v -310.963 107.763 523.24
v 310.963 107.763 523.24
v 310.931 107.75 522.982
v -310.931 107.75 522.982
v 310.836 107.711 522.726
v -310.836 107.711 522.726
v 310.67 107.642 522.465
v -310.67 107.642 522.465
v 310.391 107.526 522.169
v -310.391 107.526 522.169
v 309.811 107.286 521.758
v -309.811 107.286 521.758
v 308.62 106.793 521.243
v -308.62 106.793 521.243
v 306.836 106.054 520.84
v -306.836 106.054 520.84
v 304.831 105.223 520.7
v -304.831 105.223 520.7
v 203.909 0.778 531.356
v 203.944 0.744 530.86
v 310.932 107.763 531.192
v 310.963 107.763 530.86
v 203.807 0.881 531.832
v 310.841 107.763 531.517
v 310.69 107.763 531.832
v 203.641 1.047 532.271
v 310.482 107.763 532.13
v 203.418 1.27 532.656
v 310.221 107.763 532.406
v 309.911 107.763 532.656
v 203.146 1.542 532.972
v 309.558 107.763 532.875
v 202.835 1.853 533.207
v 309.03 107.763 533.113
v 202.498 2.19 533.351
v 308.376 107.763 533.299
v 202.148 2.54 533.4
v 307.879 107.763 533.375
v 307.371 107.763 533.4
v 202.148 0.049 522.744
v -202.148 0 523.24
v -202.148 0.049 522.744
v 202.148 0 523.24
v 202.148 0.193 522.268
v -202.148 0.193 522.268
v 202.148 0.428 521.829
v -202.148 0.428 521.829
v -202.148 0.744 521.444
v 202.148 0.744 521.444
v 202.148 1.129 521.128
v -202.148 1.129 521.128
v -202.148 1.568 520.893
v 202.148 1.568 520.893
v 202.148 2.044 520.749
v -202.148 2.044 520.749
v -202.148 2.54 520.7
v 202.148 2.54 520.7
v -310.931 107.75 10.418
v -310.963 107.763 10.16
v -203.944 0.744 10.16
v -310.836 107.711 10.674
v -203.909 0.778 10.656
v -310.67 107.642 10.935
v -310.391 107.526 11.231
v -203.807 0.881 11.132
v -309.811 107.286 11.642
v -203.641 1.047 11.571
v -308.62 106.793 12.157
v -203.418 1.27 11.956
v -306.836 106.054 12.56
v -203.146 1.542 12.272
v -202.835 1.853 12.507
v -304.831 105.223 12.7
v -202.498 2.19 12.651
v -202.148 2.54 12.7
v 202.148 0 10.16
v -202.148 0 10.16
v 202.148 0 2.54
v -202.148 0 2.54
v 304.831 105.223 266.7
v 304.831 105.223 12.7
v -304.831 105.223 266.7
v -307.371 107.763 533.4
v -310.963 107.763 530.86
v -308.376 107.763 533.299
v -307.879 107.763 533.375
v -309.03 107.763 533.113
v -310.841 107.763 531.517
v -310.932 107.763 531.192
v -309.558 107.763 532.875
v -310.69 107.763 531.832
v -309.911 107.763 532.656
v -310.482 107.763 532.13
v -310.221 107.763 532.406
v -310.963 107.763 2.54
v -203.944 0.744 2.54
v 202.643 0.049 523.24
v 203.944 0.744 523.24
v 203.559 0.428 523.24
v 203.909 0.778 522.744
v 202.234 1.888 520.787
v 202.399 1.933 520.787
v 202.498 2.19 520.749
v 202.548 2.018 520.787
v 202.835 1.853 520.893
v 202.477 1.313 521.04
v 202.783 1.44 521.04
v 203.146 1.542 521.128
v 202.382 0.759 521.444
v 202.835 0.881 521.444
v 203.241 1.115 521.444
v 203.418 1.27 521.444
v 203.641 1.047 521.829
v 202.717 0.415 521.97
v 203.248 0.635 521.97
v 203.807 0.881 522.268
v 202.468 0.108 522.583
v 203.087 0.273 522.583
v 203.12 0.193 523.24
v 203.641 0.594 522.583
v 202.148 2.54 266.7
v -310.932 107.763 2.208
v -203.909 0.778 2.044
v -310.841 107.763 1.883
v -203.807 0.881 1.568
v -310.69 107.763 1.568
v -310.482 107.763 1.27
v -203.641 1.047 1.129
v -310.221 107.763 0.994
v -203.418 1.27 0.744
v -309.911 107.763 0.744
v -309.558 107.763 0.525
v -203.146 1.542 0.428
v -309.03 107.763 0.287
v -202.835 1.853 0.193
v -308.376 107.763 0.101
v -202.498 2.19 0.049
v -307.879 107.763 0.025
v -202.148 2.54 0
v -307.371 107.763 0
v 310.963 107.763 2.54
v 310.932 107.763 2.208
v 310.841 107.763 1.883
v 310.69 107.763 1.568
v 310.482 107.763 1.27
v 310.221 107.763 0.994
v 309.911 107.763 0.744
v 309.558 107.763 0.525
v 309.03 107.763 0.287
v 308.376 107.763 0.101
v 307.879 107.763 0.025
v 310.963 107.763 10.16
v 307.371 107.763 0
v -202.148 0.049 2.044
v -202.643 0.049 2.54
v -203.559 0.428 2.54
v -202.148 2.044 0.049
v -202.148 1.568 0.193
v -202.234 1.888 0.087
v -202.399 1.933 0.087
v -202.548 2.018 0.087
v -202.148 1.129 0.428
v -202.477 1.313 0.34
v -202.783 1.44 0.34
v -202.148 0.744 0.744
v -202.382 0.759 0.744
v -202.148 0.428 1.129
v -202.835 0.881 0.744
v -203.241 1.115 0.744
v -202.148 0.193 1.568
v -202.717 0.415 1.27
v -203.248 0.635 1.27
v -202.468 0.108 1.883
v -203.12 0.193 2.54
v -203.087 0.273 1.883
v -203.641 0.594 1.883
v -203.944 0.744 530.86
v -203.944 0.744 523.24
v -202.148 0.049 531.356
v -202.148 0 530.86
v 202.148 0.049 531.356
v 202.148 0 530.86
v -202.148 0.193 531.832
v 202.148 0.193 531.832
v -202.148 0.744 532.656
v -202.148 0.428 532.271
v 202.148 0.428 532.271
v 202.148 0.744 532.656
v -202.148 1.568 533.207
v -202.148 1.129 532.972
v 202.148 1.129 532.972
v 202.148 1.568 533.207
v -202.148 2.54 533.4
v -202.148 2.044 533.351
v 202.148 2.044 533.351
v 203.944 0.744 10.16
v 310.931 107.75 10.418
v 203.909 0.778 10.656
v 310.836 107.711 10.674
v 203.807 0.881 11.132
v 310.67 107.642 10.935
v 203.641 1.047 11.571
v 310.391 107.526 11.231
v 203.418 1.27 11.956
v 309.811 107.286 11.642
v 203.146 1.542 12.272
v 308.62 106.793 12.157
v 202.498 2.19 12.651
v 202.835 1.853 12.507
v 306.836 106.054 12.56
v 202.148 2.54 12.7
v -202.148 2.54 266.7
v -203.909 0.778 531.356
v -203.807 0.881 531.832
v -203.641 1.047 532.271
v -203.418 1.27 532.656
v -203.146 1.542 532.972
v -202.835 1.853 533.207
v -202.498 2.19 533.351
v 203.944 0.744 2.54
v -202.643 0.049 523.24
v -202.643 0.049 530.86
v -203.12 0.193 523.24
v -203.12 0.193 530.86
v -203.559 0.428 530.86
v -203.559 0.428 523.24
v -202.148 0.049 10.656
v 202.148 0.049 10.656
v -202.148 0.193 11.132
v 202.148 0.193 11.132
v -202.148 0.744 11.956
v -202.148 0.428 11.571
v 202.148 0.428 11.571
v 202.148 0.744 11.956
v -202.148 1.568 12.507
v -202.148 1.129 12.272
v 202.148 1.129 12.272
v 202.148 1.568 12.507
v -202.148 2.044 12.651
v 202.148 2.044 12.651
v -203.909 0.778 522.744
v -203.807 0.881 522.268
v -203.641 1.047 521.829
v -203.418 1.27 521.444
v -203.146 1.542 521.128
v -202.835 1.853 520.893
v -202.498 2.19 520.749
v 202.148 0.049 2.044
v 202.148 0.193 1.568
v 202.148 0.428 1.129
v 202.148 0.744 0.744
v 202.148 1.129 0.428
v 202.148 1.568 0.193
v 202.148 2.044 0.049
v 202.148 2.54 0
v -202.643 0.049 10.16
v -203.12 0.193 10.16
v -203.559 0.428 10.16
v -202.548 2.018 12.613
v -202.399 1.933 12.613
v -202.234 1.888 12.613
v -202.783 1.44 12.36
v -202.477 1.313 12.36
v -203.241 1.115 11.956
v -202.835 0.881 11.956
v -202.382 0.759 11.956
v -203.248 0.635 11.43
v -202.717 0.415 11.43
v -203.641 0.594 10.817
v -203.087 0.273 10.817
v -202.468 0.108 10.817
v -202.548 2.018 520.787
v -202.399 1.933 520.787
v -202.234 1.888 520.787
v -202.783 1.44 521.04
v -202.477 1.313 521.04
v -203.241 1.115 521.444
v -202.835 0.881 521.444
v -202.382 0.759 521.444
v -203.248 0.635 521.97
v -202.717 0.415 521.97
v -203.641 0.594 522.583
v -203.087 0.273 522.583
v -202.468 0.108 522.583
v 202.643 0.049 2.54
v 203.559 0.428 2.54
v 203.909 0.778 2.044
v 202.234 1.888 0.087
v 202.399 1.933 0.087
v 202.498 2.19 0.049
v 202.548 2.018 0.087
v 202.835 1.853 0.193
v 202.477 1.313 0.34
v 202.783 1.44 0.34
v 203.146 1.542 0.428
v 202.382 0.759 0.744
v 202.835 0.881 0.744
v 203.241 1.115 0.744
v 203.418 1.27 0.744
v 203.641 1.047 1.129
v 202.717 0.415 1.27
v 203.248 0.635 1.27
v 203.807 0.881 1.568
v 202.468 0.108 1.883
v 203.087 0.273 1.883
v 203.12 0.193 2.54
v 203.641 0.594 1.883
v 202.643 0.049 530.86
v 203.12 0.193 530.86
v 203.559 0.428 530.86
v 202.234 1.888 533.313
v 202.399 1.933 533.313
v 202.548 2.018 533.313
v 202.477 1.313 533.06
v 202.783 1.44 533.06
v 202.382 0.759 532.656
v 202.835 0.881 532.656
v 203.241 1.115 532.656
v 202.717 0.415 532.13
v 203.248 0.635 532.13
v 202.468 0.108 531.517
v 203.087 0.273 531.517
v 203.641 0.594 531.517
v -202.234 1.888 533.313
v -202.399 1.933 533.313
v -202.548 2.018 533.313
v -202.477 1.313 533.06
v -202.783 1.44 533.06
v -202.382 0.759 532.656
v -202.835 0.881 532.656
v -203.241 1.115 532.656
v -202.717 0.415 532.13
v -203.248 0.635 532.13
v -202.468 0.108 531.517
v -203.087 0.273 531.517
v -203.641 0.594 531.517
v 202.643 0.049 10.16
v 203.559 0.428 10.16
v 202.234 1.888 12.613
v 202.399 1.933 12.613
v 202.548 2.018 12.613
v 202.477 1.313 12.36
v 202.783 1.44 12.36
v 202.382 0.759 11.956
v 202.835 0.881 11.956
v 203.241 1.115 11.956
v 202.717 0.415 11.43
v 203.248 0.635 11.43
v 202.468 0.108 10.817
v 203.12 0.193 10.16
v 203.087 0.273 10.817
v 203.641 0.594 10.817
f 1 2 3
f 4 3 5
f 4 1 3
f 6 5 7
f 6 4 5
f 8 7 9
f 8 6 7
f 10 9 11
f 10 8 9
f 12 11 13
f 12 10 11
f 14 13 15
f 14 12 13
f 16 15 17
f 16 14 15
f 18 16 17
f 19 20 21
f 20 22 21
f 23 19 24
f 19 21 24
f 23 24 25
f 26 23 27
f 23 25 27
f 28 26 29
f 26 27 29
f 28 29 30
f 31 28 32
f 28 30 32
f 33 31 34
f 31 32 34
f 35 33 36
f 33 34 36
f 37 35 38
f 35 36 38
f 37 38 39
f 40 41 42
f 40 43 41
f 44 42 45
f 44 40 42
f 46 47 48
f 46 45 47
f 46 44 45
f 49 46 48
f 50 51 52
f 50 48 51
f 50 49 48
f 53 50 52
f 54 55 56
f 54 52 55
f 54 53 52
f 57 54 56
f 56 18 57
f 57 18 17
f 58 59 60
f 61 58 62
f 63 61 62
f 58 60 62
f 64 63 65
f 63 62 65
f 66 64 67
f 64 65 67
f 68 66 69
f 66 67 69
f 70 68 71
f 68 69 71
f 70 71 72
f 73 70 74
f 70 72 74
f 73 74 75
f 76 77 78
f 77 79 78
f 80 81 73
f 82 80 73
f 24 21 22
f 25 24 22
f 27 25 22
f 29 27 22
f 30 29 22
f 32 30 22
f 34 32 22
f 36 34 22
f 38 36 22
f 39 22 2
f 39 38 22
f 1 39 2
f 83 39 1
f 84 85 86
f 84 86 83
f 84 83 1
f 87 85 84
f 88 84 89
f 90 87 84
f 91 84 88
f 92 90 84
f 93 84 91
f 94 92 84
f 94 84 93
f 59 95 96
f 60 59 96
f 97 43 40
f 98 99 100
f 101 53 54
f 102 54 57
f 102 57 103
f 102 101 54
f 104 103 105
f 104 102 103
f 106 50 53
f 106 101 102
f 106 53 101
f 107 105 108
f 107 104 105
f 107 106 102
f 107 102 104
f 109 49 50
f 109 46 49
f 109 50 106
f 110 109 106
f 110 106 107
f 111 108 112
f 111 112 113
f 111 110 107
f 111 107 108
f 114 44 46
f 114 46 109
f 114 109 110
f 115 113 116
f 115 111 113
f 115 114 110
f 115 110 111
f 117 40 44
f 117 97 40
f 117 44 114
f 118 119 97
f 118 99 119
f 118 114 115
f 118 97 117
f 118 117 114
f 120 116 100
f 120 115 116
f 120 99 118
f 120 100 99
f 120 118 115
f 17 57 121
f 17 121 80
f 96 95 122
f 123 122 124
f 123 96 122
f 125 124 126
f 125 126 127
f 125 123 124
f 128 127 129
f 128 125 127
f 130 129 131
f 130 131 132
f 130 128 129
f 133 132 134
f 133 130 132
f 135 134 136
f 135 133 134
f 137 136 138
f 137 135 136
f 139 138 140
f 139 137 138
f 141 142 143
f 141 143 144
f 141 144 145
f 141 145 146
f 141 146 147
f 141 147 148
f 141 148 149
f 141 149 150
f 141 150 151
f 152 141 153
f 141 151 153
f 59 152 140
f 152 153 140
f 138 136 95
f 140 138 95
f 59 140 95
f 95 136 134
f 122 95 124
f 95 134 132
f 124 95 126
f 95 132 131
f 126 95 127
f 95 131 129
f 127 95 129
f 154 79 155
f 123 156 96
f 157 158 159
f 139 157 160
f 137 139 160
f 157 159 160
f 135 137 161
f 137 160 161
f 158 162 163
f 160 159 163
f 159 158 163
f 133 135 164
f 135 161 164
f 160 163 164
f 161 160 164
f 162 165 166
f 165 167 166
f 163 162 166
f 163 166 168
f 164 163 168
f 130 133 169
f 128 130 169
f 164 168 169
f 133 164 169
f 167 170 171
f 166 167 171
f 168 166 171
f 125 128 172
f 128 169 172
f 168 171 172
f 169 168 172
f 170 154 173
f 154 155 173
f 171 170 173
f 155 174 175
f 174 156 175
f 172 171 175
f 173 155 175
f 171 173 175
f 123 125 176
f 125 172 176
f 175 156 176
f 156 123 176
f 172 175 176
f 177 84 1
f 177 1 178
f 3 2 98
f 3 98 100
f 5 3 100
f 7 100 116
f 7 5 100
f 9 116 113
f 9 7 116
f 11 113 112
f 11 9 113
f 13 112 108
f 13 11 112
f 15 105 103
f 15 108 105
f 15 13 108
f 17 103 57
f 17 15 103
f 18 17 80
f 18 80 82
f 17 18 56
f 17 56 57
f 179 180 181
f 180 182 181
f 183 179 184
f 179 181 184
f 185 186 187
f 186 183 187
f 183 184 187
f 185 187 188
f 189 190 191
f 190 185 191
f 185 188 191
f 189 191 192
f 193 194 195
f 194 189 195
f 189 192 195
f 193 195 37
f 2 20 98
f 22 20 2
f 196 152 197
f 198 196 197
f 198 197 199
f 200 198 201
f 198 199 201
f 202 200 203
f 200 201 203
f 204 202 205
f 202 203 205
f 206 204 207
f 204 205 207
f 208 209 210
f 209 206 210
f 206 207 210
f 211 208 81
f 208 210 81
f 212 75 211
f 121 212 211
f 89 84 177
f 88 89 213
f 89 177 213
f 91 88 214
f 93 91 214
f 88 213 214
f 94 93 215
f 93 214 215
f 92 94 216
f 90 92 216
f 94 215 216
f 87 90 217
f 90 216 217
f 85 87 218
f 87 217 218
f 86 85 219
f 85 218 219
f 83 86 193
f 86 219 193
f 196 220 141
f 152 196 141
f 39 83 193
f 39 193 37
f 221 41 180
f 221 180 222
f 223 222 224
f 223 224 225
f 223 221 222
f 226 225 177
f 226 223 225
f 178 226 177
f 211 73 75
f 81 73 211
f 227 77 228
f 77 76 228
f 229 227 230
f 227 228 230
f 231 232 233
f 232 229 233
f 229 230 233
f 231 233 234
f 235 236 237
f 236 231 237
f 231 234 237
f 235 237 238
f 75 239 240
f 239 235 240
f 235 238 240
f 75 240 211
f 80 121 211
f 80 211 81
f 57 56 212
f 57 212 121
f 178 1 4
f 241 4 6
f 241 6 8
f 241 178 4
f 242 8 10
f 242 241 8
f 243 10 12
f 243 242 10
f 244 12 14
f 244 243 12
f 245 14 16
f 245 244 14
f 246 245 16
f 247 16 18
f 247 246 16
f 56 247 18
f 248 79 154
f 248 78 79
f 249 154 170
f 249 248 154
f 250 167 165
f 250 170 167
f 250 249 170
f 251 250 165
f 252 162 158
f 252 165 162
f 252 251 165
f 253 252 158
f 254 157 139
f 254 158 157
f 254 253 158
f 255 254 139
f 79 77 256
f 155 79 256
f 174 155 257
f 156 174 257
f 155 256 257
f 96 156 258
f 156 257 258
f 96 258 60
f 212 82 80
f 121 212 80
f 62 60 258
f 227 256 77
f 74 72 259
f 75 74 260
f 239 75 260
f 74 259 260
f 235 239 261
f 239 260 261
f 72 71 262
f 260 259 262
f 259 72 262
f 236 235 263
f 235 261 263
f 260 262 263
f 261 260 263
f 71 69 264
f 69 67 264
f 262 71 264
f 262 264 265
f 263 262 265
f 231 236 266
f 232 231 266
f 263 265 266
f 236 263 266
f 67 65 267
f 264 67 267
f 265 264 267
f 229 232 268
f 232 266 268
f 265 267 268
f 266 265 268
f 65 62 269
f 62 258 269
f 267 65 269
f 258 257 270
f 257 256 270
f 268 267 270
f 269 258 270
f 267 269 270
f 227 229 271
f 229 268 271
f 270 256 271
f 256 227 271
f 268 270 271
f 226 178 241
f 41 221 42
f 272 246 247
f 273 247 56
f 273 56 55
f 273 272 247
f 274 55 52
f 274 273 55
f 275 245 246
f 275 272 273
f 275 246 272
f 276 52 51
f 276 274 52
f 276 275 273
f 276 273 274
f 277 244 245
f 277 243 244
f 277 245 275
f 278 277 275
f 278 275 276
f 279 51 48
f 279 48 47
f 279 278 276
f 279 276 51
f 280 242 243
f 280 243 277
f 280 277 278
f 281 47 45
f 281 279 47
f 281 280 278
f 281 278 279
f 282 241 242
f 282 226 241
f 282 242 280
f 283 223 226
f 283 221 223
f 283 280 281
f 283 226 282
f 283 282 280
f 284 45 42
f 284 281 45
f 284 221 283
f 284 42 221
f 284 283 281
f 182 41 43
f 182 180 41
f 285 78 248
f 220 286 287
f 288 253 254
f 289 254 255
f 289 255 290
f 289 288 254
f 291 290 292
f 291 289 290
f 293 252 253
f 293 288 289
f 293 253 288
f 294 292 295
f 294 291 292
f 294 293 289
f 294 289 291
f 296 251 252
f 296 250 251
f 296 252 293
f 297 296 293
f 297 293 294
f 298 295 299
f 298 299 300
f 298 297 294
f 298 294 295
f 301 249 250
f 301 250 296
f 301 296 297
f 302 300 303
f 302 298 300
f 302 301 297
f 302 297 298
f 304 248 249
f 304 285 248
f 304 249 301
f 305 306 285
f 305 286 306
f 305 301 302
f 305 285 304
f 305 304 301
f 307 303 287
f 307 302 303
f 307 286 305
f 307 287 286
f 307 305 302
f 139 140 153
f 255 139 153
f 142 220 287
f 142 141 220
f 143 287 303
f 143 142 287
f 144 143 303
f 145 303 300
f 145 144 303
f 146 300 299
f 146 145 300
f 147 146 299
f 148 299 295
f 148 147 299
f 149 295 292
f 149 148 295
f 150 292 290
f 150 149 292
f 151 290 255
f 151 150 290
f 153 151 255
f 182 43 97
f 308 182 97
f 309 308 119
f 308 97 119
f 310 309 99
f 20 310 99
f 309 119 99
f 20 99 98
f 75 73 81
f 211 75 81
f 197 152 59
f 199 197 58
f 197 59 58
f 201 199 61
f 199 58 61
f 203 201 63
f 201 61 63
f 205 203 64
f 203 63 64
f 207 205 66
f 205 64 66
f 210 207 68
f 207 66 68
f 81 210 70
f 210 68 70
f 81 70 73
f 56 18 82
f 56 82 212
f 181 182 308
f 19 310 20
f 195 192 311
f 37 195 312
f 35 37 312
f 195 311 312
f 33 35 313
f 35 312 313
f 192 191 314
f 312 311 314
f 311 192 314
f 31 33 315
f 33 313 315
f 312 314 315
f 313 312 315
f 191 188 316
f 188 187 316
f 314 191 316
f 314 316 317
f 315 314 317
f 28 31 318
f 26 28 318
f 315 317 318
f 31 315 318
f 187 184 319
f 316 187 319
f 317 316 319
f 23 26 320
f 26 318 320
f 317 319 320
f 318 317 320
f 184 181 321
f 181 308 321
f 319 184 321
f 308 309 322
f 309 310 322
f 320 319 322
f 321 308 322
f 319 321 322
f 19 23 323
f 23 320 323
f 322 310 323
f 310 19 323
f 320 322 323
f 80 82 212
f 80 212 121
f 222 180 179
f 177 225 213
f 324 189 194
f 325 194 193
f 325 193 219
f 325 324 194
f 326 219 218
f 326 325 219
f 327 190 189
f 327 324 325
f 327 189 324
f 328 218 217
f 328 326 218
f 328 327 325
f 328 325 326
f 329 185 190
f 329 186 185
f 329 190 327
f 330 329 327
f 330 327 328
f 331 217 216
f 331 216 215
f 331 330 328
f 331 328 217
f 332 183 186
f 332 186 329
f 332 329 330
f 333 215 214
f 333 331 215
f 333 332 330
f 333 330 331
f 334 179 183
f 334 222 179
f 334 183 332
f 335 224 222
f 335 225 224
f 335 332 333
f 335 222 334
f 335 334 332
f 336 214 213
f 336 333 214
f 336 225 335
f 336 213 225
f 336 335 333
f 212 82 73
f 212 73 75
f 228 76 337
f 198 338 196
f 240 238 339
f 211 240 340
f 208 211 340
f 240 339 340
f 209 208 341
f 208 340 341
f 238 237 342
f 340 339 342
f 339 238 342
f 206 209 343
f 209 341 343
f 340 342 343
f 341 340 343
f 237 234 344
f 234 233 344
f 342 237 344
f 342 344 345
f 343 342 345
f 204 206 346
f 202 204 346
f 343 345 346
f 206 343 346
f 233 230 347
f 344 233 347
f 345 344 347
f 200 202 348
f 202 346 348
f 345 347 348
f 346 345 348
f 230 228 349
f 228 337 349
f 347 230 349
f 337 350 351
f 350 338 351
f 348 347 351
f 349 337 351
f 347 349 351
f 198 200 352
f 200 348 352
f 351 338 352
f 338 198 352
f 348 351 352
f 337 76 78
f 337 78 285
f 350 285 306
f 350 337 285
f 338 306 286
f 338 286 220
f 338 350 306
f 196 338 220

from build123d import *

# Parameters (mm, degrees)
F1_DEPTH = 12.7
F2_R     = 2.54
F3_DEPTH = 254


with BuildPart() as f1:
    # F0 (on Top) → F1 (new body)
    with BuildSketch(Plane.XY):
        Polygon((-203.2, 0), (0, 0), (203.2, 0), (310.963073, 107.763073), (0, 107.763073), (-310.963073, 107.763073), align=None)
    extrude(amount=F1_DEPTH)

    # F2
    f2_edges = [f1.edges().sort_by_distance(p)[0] for p in [
        (-257.081537, 53.881537, 12.7),
        (0, 0, 12.7),
        (257.081537, 53.881537, 12.7),
        (0, 107.763073, 12.7),
        (-203.2, 0, 6.35),
        (203.2, 0, 6.35),
        (0, 0, 0),
        (257.081537, 53.881537, 0),
        (-257.081537, 53.881537, 0),
    ]]
    fillet(f2_edges, radius=F2_R)


with BuildPart() as f3:
    # F1_face (on face) → F3 (new body)
    with BuildSketch(Plane(origin=(0, 57.347761, 12.7), x_dir=(1, 0, 0), z_dir=(0, 0, 1))):
        Polygon((-304.830971, 47.875313), (-202.147898, -54.807761), (202.147898, -54.807761), (304.830971, 47.875313), align=None)
    extrude(amount=F3_DEPTH)


with BuildPart() as f4_1:
    # F4: instance of F1
    add(f1.part.mirror(Plane(origin=(0, 57.347761, 266.7), x_dir=(1, 0, 0), z_dir=(0, 0, 1))))


with BuildPart() as f4_2:
    # F4: instance of F3
    add(f3.part.mirror(Plane(origin=(0, 57.347761, 266.7), x_dir=(1, 0, 0), z_dir=(0, 0, 1))))


solid = Compound([f1.part, f3.part, f4_1.part, f4_2.part])
